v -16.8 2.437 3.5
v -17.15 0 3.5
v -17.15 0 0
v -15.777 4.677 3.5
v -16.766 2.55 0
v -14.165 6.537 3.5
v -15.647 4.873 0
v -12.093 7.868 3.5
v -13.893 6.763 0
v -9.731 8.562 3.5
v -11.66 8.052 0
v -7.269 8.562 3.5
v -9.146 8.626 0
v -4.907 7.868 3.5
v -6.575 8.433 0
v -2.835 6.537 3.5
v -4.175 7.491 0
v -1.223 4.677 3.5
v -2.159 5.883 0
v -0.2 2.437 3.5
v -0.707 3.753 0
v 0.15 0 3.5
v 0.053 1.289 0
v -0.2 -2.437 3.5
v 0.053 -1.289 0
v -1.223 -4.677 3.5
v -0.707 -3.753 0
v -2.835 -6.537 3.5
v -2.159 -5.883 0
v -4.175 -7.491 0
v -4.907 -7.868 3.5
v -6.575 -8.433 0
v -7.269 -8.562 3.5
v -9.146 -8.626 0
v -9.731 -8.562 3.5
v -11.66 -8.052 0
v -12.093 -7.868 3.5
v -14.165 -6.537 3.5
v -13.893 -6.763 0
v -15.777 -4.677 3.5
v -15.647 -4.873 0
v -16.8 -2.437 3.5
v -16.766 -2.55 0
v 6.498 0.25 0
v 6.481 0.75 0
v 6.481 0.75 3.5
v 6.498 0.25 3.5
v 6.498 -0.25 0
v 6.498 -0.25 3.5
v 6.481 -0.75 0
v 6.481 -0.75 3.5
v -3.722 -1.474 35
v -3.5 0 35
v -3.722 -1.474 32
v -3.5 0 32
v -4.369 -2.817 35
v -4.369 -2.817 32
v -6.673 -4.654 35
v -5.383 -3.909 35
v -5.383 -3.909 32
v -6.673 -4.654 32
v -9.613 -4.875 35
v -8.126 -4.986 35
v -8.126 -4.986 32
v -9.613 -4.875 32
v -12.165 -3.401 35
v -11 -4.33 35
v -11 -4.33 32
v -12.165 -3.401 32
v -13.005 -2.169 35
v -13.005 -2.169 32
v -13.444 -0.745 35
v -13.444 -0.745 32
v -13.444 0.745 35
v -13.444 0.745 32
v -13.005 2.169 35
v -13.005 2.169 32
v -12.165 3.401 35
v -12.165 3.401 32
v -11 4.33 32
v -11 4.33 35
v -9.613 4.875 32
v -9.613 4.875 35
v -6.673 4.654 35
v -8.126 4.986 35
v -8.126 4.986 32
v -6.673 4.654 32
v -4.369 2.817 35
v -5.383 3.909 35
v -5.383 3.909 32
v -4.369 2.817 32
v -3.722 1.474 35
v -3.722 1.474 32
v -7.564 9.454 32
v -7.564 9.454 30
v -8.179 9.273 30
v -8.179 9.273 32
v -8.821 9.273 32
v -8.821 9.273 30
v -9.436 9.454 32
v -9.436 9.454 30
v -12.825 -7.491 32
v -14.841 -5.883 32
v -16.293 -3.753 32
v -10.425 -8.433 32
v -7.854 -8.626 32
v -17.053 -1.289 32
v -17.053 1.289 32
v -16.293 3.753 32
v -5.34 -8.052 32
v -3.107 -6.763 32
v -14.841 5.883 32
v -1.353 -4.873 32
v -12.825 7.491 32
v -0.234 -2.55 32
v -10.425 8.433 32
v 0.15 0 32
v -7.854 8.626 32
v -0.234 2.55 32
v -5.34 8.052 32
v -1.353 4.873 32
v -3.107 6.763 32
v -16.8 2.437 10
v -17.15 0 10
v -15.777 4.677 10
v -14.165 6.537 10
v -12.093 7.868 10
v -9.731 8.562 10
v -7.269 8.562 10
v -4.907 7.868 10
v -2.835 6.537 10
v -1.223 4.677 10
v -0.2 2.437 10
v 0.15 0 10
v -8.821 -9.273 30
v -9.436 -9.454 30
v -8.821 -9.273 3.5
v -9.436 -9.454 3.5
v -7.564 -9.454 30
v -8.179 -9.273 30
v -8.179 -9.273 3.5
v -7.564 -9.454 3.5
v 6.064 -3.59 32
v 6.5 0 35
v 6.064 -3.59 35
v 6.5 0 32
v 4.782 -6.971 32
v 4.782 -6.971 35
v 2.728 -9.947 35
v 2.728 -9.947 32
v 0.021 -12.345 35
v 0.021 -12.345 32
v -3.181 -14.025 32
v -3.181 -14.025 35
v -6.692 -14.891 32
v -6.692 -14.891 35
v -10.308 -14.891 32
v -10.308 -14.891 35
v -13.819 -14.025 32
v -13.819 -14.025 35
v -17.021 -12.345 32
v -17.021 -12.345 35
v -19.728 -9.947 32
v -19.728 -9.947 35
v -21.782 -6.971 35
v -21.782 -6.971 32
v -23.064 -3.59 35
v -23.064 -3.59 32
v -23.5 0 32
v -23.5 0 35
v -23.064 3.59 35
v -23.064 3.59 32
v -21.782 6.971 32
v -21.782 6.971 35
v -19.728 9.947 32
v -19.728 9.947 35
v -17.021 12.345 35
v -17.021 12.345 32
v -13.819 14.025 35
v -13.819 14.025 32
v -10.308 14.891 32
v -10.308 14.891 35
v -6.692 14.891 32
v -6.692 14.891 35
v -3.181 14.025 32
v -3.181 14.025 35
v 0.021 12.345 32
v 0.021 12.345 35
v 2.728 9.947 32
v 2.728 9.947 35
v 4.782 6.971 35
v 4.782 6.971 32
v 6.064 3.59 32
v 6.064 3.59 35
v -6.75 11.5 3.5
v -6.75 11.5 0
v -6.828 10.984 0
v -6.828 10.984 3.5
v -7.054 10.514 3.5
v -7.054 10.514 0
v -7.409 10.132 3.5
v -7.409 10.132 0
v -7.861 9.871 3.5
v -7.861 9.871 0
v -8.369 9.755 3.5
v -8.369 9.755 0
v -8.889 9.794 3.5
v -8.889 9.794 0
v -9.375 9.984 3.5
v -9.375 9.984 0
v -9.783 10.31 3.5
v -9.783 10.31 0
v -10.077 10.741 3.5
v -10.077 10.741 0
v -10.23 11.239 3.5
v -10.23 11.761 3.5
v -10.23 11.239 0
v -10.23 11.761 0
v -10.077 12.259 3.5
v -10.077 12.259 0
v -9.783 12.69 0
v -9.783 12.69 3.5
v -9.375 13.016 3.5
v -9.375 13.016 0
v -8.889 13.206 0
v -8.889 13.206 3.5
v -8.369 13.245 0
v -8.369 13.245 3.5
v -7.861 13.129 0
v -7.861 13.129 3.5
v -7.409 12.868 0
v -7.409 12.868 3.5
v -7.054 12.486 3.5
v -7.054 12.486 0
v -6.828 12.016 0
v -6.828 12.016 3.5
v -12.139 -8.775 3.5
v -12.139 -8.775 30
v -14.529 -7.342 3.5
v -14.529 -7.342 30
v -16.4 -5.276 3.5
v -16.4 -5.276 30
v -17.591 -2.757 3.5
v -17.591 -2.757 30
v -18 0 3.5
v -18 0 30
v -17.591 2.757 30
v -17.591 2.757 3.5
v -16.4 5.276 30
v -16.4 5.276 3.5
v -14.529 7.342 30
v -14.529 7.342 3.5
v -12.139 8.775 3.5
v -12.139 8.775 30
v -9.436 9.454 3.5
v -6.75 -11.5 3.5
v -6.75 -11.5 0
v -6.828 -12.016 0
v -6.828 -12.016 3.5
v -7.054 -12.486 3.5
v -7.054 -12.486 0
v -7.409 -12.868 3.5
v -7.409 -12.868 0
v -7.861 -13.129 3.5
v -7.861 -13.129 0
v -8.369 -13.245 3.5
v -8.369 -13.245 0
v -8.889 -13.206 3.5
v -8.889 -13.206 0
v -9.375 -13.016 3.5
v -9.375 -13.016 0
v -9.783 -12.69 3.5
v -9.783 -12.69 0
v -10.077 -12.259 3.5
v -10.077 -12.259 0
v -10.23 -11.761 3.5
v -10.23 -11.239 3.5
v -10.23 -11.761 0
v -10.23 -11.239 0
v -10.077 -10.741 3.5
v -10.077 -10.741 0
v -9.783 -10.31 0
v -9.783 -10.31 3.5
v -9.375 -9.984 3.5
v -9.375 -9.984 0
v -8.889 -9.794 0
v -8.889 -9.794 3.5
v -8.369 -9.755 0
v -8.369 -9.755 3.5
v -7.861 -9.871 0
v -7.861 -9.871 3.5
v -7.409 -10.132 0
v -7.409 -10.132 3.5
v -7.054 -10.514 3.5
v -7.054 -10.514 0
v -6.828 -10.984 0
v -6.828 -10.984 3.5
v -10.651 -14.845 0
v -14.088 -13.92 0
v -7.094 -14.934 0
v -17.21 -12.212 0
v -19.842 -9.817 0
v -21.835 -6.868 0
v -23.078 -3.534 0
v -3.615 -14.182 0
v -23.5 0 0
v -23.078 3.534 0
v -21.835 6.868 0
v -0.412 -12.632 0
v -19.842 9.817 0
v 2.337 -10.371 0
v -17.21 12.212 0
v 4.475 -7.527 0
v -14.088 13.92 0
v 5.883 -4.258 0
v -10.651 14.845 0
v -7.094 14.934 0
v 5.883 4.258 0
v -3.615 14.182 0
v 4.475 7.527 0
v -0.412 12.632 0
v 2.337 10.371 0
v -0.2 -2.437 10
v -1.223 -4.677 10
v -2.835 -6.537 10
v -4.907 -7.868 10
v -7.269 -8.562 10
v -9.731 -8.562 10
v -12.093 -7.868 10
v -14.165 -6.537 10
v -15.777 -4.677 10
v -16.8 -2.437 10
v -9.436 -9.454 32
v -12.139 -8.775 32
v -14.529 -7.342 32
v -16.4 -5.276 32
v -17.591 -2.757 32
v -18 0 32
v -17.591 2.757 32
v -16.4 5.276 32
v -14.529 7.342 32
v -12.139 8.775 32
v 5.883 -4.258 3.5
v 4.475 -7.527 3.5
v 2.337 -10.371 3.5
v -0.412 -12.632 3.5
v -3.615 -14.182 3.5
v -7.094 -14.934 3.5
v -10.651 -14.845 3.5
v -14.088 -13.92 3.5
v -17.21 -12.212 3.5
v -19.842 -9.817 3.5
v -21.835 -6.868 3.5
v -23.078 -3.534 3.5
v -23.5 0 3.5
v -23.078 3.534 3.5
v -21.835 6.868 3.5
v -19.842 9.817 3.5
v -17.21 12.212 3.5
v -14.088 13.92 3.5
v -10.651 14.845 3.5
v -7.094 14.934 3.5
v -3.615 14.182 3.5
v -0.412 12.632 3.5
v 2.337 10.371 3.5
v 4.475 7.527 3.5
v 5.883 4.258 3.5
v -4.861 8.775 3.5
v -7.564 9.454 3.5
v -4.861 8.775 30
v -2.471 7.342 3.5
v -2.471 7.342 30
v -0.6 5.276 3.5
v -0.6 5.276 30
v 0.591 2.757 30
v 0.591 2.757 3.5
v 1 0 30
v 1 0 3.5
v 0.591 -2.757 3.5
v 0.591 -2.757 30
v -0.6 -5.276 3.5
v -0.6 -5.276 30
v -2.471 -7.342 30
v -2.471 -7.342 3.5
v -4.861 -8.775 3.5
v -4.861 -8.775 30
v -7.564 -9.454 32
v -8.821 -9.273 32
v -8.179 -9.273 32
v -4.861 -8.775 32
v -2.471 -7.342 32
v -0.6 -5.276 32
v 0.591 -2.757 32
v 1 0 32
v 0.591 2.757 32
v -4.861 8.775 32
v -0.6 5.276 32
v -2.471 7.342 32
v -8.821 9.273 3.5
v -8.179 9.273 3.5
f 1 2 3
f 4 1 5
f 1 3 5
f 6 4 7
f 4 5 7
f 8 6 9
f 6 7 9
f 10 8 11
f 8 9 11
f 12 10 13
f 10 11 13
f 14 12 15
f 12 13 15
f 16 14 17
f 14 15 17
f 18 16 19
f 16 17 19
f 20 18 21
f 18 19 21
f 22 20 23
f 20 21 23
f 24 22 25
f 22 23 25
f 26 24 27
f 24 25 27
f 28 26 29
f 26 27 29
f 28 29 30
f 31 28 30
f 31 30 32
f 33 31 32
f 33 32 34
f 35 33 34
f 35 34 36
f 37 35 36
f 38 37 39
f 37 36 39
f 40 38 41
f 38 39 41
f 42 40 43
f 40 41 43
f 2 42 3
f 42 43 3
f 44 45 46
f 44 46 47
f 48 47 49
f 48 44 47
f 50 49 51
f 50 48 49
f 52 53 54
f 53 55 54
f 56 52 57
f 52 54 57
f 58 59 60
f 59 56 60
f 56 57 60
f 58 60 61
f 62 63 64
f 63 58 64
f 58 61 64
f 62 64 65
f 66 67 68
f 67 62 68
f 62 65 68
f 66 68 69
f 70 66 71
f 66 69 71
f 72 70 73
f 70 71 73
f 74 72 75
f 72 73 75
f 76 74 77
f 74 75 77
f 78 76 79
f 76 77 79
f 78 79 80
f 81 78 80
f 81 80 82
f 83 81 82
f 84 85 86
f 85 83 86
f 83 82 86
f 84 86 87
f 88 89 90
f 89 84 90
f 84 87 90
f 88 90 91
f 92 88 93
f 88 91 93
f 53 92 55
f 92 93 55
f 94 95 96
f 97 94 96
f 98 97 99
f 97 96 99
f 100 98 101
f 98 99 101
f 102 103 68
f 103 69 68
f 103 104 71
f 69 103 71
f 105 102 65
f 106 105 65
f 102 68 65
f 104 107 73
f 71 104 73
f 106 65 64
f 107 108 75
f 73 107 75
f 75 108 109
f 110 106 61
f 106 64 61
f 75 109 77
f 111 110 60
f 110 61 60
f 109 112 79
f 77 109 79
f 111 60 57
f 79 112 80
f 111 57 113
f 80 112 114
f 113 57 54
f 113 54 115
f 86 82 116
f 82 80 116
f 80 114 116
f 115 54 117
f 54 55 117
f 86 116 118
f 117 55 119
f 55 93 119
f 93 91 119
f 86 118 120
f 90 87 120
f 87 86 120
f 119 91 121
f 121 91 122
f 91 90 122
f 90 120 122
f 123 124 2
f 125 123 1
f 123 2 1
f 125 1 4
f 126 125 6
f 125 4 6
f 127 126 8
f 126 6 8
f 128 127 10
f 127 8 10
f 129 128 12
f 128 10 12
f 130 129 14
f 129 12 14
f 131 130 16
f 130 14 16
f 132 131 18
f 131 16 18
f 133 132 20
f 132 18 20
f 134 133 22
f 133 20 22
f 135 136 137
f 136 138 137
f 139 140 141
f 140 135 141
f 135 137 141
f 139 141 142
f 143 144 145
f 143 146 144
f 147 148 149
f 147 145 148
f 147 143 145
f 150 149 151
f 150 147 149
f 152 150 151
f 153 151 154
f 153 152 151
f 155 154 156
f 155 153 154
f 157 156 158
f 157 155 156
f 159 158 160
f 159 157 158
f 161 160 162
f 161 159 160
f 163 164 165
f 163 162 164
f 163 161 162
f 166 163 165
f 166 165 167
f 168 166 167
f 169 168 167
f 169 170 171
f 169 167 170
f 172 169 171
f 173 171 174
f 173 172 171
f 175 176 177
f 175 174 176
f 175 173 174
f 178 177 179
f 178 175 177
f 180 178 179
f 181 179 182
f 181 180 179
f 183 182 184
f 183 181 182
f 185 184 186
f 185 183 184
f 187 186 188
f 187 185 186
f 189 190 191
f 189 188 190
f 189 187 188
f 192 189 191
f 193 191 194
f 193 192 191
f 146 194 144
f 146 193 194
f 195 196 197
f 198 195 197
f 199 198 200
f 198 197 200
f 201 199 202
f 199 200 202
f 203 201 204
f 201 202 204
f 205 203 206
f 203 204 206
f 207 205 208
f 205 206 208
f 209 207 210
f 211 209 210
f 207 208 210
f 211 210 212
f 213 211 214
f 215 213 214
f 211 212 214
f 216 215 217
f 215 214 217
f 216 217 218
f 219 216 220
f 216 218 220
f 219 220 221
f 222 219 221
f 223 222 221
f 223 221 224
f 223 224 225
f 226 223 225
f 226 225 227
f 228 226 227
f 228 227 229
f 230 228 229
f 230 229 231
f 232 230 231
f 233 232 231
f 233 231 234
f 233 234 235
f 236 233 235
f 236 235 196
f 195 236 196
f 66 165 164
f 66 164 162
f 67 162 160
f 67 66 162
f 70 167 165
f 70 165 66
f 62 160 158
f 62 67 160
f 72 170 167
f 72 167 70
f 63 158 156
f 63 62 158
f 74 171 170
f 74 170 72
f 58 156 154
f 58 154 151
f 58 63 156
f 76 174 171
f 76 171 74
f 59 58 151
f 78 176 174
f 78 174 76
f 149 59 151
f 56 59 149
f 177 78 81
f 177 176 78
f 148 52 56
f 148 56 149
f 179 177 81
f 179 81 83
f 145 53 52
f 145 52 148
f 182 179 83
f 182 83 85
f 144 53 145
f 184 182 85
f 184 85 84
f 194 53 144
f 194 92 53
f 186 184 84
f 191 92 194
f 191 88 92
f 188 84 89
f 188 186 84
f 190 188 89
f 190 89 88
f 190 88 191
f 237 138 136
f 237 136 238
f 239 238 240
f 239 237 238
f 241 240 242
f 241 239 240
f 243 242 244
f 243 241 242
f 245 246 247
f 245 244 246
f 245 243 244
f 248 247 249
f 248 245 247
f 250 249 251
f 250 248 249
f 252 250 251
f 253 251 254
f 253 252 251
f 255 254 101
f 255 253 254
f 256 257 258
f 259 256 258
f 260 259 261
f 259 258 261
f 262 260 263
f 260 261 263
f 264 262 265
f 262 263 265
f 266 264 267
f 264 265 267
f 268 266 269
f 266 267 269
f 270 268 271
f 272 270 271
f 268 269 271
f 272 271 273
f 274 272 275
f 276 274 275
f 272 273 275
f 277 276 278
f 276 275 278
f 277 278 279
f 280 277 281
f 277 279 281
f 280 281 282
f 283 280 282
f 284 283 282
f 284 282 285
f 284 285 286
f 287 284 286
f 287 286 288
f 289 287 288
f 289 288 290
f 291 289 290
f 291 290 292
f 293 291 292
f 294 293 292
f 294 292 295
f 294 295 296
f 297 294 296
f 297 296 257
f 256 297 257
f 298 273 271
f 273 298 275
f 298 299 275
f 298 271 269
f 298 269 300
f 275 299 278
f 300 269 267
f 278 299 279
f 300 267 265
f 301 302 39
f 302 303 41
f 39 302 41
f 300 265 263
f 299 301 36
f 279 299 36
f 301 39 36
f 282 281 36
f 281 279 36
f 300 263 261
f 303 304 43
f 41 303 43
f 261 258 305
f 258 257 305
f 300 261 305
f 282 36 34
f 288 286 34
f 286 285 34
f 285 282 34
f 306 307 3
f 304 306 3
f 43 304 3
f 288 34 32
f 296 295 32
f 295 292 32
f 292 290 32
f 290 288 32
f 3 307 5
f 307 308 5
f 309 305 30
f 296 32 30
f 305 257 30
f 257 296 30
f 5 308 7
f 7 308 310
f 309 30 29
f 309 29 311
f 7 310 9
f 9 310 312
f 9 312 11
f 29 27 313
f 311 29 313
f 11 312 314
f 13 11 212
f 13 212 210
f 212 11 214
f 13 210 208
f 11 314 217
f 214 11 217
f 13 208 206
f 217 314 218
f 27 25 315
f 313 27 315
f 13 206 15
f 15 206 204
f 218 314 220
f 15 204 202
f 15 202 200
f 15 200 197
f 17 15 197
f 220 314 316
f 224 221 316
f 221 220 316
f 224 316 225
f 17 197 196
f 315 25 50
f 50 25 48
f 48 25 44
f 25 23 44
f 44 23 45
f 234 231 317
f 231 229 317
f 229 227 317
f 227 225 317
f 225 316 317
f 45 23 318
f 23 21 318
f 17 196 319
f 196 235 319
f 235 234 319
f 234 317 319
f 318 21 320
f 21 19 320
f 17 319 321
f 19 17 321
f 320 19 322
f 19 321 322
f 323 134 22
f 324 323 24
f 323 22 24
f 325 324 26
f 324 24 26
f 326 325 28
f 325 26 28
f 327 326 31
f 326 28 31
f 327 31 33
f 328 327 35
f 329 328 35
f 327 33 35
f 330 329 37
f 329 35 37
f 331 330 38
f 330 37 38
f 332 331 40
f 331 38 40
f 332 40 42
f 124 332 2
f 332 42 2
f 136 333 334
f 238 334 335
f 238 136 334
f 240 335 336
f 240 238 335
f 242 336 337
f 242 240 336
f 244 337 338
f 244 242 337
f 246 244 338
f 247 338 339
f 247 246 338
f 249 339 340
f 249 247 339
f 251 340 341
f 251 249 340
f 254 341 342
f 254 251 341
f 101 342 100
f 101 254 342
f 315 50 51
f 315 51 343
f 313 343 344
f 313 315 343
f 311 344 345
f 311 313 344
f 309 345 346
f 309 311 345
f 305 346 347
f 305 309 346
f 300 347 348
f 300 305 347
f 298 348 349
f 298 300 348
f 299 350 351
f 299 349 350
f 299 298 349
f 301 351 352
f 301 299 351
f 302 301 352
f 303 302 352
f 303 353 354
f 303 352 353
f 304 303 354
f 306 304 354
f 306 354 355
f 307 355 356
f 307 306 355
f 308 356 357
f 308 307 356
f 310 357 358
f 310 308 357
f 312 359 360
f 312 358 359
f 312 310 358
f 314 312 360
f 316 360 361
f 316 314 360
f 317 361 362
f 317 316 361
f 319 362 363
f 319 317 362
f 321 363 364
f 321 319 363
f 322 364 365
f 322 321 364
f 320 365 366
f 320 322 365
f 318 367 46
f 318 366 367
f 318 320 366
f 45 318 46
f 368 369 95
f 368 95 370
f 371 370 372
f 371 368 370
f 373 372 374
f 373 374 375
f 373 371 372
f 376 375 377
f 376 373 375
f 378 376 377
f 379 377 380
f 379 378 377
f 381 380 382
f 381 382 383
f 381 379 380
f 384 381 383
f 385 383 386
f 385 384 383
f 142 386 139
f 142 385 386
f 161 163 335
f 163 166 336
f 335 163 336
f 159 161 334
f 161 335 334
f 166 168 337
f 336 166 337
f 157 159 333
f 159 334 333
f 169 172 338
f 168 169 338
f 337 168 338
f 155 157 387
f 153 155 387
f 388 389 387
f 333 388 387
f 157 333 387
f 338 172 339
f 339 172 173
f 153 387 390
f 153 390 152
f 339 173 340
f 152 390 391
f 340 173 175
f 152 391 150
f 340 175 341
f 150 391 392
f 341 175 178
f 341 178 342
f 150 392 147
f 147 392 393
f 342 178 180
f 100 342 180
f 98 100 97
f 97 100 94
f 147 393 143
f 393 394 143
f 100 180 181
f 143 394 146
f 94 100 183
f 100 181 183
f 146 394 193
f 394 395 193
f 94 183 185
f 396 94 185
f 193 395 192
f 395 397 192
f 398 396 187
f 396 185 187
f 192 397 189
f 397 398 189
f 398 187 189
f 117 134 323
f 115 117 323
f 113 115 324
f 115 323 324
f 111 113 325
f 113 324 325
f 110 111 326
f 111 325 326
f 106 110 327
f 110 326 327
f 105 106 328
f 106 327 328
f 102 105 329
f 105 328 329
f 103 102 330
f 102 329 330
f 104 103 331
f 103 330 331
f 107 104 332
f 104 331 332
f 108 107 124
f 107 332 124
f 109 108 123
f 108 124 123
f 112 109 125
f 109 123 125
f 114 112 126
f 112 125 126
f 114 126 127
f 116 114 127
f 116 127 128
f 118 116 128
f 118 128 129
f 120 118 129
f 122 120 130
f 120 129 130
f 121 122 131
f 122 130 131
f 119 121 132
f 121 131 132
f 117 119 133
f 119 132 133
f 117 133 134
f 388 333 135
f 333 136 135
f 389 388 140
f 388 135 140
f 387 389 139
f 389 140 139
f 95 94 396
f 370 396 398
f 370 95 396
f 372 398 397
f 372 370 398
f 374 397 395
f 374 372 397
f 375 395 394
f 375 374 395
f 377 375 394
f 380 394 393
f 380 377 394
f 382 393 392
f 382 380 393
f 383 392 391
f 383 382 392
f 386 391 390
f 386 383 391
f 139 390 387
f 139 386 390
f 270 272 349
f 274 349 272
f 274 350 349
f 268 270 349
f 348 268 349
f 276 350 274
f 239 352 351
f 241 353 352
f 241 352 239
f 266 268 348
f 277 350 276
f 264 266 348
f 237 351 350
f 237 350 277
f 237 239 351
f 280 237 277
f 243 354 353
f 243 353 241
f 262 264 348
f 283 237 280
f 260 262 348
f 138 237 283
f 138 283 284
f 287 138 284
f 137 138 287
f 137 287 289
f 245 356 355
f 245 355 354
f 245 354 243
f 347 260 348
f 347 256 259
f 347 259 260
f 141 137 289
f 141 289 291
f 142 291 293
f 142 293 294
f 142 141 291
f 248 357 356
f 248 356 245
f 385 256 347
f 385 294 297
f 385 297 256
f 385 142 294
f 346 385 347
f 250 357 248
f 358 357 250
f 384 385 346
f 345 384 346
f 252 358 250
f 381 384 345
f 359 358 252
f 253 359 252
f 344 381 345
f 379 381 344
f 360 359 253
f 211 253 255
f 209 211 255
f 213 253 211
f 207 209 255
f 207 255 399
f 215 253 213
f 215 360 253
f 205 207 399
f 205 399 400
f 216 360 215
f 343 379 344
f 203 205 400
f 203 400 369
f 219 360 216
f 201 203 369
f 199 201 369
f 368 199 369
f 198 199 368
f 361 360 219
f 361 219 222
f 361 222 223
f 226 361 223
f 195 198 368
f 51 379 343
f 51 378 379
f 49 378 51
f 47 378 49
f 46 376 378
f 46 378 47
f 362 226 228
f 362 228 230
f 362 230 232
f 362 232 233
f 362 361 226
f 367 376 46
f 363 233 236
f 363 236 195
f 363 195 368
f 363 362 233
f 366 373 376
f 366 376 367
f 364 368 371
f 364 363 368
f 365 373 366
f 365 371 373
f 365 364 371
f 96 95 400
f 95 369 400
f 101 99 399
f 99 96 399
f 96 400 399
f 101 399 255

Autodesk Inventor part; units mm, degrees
ref_plane "YZ Plane" through (0, 0, 0) normal (1, 0, 0) x (0, 1, 0)
ref_plane "XZ Plane" through (0, 0, 0) normal (0, 1, 0) x (-1, 0, 0)
sketch "Boceto1" plane through (0, 0, 0) normal (0, 0, 1) x (1, 0, 0)
  circle A0 centre (-8.5, 0) radius 8.65
  circle A1 centre (-8.5, -11.5) radius 1.75
  circle A2 centre (-8.5, 11.5) radius 1.75
  circle A3 centre (-8.5, 0) radius 14.5
  circle A4 centre (-8.5, 0) radius 14.5
  circle A5 centre (-8.5, 0) radius 9.5
  circle A6 centre (-8.5, -11.5) radius 2.25
  circle A7 centre (-8.5, 11.5) radius 2.25
  point P0 (0, 0)
  dimension "d0" = 17.3
  dimension "d1" = 3.5
  dimension "d2" = 3.5
  dimension "d3" = 19
  dimension "d4" = 4.5
  dimension "d5" = 4.5
sketch "Boceto2" plane through (0, 0, 0) normal (0, 0, 1) x (1, 0, 0)
  arc A0 (6.4812, 0.75) -> (6.4812, -0.75) centre (-8.5, 0) ccw projected
  circle A1 centre (-8.5, 0) radius 15
  point P0 (0, 0)
  point P1 (6.4812, -0.75)
  point P2 (6.4812, 0.75)
extrude "Extrusión1" add sketch "Boceto2" along normal blind 3.5
sketch "Boceto3" plane through (-8.5, 0, 3.5) normal (0, 0, 1) x (1, 0, 0)
  circle A0 centre (0, -11.5) radius 1.75 projected
  circle A1 centre (0, -11.5) radius 2.25 projected
  circle A2 centre (0, 0) radius 9.5 projected
  circle A3 centre (0, 0) radius 8.65 projected
  circle A4 centre (0, 11.5) radius 2.25 projected
  circle A5 centre (0, 11.5) radius 1.75 projected
  point P0 (8.5, 0)
  point P1 (0.9357, 9.4538)
  point P2 (-0.9357, 9.4538)
  point P3 (-0.9357, -9.4538)
  point P4 (0.9357, -9.4538)
sketch "Boceto4" plane through (-8.5, 0, 3.5) normal (0, 0, 1) x (1, 0, 0)
  circle A0 centre (0, 0) radius 5
  point P0 (8.5, 0)
  dimension "d8" = 10
extrude "Extrusión2" cut sketch "Boceto4" against normal blind 10
ref_plane "Plano de trabajo1" through (-16.5, -8, 30) normal (0, 0, 1) x (1, 0, 0)
extrude "Extrusión3" add sketch "Boceto3" along normal up to surface (26.5 mm away) contours A1 A2 A4
extrude "Extrusión4" cut sketch "Boceto1" along normal blind 10 contours A1 | A2
sketch "Boceto5" plane through (-8.5, 11.5, 30) normal (0, 0, 1) x (1, 0, 0)
  arc A0 (0.9357, -20.9538) -> (0.9357, -2.0462) centre (0, -11.5) ccw projected
  arc A1 (-0.9357, -2.0462) -> (-0.9357, -20.9538) centre (0, -11.5) ccw projected
  arc A2 (-0.9357, -2.0462) -> (0.9357, -2.0462) centre (0, 0) ccw projected
  arc A3 (0.9357, -20.9538) -> (-0.9357, -20.9538) centre (0, -23) ccw projected
  circle A4 centre (0, -11.5) radius 8.65 projected
  point P0 (8.5, -11.5)
extrude "Extrusión5" add sketch "Boceto5" along normal blind 2
sketch "Boceto6" plane through (-8.5, 11.5, 32) normal (0, 0, 1) x (1, 0, 0)
  circle A0 centre (0, -11.5) radius 15 projected
  circle A1 centre (0, -11.5) radius 5 projected
  circle A2 centre (0, -11.5) radius 5 projected
  point P0 (8.5, -11.5)
extrude "Extrusión6" add sketch "Boceto6" along normal blind 3
sketch "Boceto7" plane through (-8.5, 0, 0) normal (0, 0, -1) x (-1, 0, 0)
  circle A0 centre (0, 0) radius 5 projected
  circle A1 centre (0, 0) radius 8.65
  point P0 (-8.5, 0)
  dimension "d19" = 17.3
extrude "Extrusión7" cut sketch "Boceto7" against normal blind 10 contours A0 | A1
properties part number "TeceraParte"
